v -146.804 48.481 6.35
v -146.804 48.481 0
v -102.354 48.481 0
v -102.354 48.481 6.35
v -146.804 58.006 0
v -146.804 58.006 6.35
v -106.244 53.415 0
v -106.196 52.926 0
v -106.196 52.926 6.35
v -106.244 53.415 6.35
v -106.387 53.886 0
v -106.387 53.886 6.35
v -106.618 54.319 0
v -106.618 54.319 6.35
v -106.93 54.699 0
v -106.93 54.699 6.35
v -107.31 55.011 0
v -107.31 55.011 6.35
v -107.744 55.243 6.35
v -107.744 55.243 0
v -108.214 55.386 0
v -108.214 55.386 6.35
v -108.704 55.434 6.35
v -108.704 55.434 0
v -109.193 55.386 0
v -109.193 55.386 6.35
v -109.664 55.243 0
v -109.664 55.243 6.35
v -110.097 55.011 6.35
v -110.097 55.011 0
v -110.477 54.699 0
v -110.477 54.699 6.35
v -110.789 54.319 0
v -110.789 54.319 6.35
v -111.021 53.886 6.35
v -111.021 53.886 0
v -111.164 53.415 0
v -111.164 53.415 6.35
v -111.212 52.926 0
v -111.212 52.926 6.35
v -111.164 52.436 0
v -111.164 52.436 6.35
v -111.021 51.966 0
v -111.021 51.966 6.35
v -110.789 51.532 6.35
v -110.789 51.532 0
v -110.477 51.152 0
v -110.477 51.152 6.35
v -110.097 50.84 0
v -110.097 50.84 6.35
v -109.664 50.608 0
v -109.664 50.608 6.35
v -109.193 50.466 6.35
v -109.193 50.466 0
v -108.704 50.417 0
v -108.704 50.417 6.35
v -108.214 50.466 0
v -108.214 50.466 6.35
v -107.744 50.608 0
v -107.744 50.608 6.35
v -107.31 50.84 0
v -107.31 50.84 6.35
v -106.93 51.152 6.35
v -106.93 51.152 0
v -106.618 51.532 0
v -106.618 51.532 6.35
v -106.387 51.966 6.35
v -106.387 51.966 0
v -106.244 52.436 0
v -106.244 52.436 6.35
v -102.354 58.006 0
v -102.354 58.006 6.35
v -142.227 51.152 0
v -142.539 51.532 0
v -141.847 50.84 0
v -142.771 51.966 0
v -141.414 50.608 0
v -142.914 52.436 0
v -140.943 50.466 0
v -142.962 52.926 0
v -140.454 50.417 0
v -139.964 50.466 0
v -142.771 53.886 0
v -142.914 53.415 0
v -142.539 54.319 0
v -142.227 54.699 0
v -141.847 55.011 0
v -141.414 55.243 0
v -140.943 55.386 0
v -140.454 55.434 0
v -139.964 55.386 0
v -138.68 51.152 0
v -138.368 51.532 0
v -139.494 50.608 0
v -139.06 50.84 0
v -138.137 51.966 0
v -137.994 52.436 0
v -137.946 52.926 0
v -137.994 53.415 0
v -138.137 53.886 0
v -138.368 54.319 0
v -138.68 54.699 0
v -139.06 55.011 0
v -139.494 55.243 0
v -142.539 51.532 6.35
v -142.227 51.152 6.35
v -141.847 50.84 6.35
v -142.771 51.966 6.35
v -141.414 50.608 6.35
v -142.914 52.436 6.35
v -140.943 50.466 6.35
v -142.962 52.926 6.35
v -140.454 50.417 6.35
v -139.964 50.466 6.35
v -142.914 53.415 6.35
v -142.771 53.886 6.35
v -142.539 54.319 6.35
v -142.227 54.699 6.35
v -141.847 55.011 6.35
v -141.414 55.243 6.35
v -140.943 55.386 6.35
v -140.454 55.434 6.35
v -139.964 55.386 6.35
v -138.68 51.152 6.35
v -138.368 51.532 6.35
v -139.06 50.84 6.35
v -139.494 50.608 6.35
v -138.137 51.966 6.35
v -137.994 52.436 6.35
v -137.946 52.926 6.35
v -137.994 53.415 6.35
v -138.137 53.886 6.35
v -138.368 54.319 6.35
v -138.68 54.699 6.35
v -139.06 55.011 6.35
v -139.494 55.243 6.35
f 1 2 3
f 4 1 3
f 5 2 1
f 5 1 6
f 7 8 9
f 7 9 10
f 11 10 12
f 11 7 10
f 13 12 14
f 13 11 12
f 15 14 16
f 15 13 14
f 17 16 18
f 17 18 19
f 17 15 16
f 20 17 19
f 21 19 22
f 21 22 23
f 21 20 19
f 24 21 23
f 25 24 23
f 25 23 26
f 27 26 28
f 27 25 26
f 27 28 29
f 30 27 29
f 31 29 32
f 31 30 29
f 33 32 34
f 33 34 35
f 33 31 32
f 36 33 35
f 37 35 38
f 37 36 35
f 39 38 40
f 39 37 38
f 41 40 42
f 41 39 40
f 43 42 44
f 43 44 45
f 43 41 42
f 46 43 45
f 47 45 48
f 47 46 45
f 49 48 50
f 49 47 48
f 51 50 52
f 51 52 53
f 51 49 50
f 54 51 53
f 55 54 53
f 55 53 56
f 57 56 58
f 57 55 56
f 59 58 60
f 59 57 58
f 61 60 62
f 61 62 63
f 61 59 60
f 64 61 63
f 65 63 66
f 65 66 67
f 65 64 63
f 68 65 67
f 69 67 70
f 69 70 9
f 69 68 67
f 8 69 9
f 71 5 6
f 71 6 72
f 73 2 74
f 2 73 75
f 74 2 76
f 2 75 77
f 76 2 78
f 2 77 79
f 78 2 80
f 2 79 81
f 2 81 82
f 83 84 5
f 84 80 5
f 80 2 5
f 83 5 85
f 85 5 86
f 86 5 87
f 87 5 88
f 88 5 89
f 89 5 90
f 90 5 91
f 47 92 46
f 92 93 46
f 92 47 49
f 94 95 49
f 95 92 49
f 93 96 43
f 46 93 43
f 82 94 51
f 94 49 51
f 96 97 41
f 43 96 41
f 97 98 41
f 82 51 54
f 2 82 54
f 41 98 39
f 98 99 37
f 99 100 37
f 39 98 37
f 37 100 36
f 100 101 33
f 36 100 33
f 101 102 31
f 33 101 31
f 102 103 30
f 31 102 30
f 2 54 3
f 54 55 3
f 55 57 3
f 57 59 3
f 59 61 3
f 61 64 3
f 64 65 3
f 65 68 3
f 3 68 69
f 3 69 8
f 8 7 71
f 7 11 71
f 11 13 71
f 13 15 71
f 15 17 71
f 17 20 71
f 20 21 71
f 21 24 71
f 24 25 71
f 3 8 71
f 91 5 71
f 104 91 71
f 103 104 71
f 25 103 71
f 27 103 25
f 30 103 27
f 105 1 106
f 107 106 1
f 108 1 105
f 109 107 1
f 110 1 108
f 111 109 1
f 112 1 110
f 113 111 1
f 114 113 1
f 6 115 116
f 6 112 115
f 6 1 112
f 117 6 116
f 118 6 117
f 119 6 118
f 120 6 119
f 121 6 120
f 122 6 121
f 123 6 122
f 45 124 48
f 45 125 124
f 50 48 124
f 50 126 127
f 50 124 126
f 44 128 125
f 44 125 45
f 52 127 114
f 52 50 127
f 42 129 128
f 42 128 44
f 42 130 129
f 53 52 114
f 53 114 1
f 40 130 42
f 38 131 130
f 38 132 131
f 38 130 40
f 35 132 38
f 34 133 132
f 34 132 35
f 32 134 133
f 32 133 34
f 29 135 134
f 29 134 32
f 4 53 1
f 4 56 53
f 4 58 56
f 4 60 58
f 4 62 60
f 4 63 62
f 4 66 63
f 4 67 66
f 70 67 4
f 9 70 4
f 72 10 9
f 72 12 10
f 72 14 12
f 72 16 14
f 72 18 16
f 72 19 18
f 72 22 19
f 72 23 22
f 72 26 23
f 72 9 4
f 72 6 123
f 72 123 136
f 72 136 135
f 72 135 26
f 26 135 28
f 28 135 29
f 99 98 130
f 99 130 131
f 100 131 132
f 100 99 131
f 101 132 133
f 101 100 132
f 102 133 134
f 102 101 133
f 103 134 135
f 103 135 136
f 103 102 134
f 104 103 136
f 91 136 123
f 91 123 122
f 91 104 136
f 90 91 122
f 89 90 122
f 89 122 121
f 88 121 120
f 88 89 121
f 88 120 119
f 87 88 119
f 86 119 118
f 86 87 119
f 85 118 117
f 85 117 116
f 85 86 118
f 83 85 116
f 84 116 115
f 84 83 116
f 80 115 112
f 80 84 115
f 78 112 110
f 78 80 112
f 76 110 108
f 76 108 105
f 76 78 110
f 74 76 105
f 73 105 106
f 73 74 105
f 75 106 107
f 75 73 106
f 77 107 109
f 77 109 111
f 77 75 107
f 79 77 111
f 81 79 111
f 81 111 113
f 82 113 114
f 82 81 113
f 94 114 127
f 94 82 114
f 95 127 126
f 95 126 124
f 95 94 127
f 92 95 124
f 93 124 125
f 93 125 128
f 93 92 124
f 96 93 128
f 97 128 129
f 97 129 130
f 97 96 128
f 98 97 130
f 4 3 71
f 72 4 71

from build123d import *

# Parameters (mm, degrees)
SKETCH_1_W      = 44.45
SKETCH_1_H      = 9.525
SKETCH_1_R      = 2.50825
EXTRUDE_1_DEPTH = 6.35


with BuildPart() as part:
    # Эскиз1 → Бобышка-Вытянуть1 (new body)
    with BuildSketch(Plane.XY):
        with Locations((-124.578833131, 53.243233664)):
            Rectangle(SKETCH_1_W, SKETCH_1_H)
        with Locations((-108.703833131, 52.925733664)):
            Circle(SKETCH_1_R, mode=Mode.SUBTRACT)
        with Locations((-140.453833131, 52.925733664)):
            Circle(SKETCH_1_R, mode=Mode.SUBTRACT)
    extrude(amount=EXTRUDE_1_DEPTH)


solid = part.part
